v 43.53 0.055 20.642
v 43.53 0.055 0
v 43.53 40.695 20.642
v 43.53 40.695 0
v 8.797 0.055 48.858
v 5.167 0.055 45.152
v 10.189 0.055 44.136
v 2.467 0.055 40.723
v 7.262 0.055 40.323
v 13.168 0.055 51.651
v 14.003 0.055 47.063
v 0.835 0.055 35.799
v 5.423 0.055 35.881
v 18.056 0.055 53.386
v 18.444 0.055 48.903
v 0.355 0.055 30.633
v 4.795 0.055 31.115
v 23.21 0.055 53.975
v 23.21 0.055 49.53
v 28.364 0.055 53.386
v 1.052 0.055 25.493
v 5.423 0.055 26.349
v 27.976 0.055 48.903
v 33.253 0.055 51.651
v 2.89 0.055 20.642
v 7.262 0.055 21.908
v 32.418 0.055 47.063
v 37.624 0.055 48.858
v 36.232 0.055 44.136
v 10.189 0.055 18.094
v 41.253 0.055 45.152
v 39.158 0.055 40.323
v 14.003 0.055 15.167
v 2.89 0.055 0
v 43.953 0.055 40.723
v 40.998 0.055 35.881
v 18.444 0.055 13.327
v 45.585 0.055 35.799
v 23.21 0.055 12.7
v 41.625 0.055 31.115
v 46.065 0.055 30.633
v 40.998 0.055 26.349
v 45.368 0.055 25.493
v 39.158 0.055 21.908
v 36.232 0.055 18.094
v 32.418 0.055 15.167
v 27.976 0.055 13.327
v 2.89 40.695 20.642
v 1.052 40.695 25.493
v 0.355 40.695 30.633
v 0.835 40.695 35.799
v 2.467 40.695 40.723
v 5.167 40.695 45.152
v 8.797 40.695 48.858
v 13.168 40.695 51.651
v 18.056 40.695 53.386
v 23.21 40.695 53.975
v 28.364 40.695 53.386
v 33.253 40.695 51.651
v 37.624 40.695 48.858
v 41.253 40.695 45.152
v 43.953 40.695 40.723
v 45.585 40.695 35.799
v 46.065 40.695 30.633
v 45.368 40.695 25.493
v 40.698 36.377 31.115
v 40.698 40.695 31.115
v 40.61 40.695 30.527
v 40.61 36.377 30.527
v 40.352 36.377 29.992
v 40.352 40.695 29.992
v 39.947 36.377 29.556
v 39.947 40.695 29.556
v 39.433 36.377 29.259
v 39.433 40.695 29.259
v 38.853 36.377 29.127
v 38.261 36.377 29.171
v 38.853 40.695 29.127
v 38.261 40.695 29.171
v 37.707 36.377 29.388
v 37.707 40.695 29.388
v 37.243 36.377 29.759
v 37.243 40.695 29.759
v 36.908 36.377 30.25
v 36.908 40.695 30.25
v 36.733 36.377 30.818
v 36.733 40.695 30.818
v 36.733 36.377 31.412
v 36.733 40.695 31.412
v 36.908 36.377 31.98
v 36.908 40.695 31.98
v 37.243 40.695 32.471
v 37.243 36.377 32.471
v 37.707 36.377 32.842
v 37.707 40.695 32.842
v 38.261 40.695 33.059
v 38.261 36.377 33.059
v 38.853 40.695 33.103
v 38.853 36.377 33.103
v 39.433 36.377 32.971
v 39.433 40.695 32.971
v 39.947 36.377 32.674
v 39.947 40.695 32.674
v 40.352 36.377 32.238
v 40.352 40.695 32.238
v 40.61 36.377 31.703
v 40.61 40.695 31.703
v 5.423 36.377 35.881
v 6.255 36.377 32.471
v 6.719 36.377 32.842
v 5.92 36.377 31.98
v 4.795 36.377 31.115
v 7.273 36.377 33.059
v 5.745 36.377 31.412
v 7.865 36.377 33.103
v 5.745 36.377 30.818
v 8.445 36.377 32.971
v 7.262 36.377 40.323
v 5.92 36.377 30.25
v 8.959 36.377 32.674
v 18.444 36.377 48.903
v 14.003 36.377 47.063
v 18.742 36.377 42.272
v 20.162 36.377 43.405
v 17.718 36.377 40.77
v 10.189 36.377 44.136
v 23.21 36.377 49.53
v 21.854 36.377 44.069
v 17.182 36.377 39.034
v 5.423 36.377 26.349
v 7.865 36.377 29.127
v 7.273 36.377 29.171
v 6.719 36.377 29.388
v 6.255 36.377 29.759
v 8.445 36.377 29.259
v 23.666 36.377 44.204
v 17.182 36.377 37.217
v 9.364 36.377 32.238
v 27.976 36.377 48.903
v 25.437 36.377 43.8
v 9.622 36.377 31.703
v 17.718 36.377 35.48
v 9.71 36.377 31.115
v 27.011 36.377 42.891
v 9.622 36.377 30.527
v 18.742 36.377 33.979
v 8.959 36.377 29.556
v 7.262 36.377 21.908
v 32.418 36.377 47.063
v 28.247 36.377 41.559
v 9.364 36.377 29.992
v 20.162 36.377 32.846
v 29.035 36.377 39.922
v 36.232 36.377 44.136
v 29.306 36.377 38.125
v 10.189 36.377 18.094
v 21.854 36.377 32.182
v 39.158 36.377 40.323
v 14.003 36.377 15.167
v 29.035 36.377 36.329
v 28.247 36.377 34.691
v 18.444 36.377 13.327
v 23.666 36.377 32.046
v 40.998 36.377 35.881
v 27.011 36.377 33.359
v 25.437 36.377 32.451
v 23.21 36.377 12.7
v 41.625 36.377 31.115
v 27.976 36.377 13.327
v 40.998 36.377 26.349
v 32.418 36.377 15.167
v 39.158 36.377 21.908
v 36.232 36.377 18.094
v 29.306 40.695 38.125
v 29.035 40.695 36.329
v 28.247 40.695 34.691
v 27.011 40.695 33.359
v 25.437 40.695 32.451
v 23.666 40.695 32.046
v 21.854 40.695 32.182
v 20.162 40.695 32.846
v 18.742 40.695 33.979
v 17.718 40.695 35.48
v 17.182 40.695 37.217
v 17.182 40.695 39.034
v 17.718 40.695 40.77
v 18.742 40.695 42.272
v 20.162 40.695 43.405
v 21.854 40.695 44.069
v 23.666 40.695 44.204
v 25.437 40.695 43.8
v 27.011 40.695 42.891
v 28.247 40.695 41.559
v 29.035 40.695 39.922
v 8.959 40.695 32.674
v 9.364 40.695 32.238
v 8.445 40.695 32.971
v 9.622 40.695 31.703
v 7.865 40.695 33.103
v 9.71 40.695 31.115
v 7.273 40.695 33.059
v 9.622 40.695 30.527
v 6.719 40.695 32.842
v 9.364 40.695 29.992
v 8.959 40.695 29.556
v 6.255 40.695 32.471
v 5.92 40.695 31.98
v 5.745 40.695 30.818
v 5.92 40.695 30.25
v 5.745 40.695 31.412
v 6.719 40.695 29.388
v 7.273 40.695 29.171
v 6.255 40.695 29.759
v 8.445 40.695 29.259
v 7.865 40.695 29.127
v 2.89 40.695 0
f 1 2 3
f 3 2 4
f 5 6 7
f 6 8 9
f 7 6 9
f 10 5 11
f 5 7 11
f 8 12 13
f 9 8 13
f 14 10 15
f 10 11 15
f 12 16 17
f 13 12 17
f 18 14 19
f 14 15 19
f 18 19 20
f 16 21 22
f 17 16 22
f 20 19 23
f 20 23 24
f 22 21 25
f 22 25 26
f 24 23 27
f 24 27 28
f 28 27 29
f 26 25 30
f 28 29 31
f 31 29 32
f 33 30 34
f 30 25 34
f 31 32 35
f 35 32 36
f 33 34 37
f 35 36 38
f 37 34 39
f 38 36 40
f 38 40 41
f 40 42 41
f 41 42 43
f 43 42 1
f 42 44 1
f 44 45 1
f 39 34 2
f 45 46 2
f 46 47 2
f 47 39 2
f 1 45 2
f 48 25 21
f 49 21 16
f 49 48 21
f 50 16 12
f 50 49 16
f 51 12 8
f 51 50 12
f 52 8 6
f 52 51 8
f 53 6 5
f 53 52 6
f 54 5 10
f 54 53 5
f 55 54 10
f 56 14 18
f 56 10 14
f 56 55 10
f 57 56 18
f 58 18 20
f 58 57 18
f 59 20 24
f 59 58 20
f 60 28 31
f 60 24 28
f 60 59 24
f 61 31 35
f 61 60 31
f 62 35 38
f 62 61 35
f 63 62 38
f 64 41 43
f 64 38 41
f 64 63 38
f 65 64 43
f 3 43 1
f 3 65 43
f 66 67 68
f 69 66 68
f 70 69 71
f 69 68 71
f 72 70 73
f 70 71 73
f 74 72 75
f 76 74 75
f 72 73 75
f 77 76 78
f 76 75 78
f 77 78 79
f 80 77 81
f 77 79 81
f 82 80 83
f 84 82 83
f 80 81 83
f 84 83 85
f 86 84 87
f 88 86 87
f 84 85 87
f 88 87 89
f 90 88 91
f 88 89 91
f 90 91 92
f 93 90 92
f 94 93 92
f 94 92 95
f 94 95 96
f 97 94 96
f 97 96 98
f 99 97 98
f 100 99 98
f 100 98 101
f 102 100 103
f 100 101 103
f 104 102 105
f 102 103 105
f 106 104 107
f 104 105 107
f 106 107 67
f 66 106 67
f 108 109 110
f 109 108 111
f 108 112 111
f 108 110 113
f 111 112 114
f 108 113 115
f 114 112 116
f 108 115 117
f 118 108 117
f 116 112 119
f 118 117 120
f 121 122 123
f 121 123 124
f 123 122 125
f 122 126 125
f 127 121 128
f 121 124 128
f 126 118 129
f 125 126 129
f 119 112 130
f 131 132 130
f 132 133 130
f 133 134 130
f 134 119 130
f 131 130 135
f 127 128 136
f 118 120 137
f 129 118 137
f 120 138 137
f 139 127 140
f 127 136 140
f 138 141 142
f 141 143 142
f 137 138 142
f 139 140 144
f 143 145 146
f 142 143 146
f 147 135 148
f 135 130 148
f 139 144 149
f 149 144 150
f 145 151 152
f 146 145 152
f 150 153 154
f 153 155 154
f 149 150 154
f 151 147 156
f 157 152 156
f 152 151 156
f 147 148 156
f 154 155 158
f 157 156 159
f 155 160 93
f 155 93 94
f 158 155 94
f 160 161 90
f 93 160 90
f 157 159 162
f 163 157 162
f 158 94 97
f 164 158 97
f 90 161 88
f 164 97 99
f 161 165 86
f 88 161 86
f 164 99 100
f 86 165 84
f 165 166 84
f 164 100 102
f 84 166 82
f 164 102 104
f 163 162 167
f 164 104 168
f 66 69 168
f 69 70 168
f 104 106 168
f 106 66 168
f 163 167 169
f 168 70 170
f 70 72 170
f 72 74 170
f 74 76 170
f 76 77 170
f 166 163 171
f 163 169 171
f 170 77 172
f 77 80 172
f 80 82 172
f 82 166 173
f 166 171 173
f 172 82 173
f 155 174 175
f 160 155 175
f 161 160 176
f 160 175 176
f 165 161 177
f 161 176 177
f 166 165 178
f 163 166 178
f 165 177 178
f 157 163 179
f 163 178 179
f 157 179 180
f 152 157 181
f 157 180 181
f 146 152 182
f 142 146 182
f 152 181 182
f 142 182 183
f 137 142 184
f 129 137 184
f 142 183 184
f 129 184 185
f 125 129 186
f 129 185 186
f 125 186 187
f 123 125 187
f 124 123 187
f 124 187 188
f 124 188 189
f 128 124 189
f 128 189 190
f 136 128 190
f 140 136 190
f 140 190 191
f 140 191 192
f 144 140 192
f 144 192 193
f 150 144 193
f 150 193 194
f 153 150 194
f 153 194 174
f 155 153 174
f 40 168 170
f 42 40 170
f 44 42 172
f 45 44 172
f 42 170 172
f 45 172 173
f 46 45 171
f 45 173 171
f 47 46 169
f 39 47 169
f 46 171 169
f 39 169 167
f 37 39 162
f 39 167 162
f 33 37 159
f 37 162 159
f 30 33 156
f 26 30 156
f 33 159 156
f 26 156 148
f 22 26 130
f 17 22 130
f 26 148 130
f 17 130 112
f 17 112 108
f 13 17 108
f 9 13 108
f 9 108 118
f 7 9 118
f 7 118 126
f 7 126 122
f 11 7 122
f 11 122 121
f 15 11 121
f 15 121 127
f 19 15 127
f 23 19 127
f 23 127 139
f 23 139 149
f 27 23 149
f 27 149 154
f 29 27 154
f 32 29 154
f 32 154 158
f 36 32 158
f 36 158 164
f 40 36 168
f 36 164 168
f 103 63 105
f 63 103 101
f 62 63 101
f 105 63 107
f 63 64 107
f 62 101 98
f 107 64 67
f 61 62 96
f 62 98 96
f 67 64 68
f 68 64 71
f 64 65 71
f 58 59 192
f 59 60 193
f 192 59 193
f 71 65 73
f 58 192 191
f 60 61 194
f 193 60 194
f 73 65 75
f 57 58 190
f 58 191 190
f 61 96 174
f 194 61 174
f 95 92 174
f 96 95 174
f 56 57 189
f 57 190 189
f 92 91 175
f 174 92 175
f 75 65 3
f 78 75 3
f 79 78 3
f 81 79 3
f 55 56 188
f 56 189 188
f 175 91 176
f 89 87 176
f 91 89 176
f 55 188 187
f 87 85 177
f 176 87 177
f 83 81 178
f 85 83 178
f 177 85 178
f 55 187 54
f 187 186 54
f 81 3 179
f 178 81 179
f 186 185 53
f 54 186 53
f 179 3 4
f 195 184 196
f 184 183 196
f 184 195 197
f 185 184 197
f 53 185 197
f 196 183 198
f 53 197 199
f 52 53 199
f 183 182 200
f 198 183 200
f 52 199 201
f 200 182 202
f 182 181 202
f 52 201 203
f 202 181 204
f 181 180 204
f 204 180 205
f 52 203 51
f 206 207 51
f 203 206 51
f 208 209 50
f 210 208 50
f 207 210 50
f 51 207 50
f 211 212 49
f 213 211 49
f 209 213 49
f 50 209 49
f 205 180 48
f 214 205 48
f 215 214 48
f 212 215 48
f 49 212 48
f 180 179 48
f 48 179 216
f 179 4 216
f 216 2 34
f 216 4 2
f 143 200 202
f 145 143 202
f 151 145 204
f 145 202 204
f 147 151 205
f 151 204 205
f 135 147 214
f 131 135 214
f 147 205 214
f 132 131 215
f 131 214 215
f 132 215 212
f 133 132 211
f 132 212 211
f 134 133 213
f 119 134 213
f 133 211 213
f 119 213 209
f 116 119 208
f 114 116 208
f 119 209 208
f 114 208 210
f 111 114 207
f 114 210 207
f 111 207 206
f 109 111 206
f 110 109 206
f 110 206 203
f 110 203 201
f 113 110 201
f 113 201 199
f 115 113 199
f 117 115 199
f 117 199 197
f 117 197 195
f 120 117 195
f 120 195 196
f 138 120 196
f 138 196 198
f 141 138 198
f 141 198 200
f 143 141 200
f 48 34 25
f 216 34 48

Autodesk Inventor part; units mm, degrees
ref_plane "YZ Plane" through (0, 0, 0) normal (1, 0, 0) x (0, 1, 0)
ref_plane "XZ Plane" through (0, 0, 0) normal (0, 1, 0) x (-1, 0, 0)
ref_plane "XY Plane" through (0, 0, 0) normal (0, 0, 1) x (1, 0, 0)
ref_plane "Work Plane2" through (0, 0, 0) normal (0, 0, 1) x (1, 0, 0)
sketch "Sketch1" plane through (0, 0, 0) normal (0, 0, 1) x (1, 0, 0)
  line L0 (29.5603, 0.0547) -> (16.8603, 0.0547)
  line L1 (16.8603, 0.0547) -> (16.8603, 40.6947)
  line L2 (16.8603, 40.6947) -> (29.5603, 40.6947)
  line L3 (29.5603, 40.6947) -> (29.5603, 0.0547)
  point P0 (0, 0)
  dimension "d0" = 12.7
  dimension "d1" = 40.64
extrude "Extrusion1" add sketch "Sketch1" along normal blind 12.7
sketch "Sketch2" plane through (16.8603, 40.6947, 0) normal (0, 1, 0) x (1, 0, 0)
  circle A0 centre (6.35, -31.115) radius 18.415
  line L0 (12.7, -12.7) -> (0, -12.7) projected
  line L1 (0, 0) -> (0, -12.7) projected
  circle A1 centre (6.35, -31.115) radius 22.86
  point P0 (-16.8603, 0)
  point P1 (6.35, -12.7)
  dimension "d4" = 36.83
  dimension "d6" = 6.35
  dimension "d7" = 45.72
extrude "Extrusion2" add sketch "Sketch2" against normal blind 40.64
sketch "Sketch3" plane through (16.8603, 40.6947, 0) normal (0, 1, 0) x (1, 0, 0)
  circle A0 centre (6.35, -31.115) radius 18.415
  circle A1 centre (6.35, -31.115) radius 18.415 projected
  circle A2 centre (21.844, -31.115) radius 1.9939
  circle A3 centre (-9.144, -31.115) radius 1.9939
  circle A4 centre (6.35, -38.1254) radius 6.096
  point P0 (-16.8603, 0)
  point P1 (2.6162, -31.115)
  dimension "d10" = 36.83
  dimension "d21" = 3.9878
  dimension "d22" = 3.9878
  dimension "d23" = 30.988
  dimension "d27" = 12.192
  dimension "d28" = 7.0104
extrude "Extrusion3" add sketch "Sketch3" against normal blind 4.318
sketch "Sketch6" plane through (0, 0, 0) normal (0, 0, -1) x (-1, 0, 0)
  line L0 (-16.8603, 0.0547) -> (-2.8903, 0.0547)
  line L1 (-2.8903, 0.0547) -> (-2.8903, 40.6947)
  line L2 (-2.8903, 40.6947) -> (-16.8603, 40.6947)
  line L3 (-16.8603, 40.6947) -> (-16.8603, 0.0547)
  point P0 (0, 0)
  dimension "d36" = 13.97
  dimension "d37" = 40.64
extrude "Extrusion4" add sketch "Sketch6" against normal up to next
sketch "Sketch7" plane through (0, 0, 0) normal (0, 0, -1) x (-1, 0, 0)
  line L0 (-29.5603, 40.6947) -> (-29.5603, 0.0547) projected
  line L1 (-46.0703, 40.6947) -> (-0.3503, 40.6947) projected
  line L2 (-29.5603, 0.0547) -> (-43.5303, 0.0547)
  line L3 (-43.5303, 0.0547) -> (-43.5303, 40.6947)
  line L4 (-43.5303, 40.6947) -> (-29.5603, 40.6947)
  line L5 (-29.5603, 40.6947) -> (-29.5603, 0.0547)
  point P0 (0, 0)
  point P1 (-2.8903, 40.6947)
  dimension "d40" = 13.97
extrude "Extrusion5" add sketch "Sketch7" against normal up to next
properties part number "Suspension Bracket Mount"
